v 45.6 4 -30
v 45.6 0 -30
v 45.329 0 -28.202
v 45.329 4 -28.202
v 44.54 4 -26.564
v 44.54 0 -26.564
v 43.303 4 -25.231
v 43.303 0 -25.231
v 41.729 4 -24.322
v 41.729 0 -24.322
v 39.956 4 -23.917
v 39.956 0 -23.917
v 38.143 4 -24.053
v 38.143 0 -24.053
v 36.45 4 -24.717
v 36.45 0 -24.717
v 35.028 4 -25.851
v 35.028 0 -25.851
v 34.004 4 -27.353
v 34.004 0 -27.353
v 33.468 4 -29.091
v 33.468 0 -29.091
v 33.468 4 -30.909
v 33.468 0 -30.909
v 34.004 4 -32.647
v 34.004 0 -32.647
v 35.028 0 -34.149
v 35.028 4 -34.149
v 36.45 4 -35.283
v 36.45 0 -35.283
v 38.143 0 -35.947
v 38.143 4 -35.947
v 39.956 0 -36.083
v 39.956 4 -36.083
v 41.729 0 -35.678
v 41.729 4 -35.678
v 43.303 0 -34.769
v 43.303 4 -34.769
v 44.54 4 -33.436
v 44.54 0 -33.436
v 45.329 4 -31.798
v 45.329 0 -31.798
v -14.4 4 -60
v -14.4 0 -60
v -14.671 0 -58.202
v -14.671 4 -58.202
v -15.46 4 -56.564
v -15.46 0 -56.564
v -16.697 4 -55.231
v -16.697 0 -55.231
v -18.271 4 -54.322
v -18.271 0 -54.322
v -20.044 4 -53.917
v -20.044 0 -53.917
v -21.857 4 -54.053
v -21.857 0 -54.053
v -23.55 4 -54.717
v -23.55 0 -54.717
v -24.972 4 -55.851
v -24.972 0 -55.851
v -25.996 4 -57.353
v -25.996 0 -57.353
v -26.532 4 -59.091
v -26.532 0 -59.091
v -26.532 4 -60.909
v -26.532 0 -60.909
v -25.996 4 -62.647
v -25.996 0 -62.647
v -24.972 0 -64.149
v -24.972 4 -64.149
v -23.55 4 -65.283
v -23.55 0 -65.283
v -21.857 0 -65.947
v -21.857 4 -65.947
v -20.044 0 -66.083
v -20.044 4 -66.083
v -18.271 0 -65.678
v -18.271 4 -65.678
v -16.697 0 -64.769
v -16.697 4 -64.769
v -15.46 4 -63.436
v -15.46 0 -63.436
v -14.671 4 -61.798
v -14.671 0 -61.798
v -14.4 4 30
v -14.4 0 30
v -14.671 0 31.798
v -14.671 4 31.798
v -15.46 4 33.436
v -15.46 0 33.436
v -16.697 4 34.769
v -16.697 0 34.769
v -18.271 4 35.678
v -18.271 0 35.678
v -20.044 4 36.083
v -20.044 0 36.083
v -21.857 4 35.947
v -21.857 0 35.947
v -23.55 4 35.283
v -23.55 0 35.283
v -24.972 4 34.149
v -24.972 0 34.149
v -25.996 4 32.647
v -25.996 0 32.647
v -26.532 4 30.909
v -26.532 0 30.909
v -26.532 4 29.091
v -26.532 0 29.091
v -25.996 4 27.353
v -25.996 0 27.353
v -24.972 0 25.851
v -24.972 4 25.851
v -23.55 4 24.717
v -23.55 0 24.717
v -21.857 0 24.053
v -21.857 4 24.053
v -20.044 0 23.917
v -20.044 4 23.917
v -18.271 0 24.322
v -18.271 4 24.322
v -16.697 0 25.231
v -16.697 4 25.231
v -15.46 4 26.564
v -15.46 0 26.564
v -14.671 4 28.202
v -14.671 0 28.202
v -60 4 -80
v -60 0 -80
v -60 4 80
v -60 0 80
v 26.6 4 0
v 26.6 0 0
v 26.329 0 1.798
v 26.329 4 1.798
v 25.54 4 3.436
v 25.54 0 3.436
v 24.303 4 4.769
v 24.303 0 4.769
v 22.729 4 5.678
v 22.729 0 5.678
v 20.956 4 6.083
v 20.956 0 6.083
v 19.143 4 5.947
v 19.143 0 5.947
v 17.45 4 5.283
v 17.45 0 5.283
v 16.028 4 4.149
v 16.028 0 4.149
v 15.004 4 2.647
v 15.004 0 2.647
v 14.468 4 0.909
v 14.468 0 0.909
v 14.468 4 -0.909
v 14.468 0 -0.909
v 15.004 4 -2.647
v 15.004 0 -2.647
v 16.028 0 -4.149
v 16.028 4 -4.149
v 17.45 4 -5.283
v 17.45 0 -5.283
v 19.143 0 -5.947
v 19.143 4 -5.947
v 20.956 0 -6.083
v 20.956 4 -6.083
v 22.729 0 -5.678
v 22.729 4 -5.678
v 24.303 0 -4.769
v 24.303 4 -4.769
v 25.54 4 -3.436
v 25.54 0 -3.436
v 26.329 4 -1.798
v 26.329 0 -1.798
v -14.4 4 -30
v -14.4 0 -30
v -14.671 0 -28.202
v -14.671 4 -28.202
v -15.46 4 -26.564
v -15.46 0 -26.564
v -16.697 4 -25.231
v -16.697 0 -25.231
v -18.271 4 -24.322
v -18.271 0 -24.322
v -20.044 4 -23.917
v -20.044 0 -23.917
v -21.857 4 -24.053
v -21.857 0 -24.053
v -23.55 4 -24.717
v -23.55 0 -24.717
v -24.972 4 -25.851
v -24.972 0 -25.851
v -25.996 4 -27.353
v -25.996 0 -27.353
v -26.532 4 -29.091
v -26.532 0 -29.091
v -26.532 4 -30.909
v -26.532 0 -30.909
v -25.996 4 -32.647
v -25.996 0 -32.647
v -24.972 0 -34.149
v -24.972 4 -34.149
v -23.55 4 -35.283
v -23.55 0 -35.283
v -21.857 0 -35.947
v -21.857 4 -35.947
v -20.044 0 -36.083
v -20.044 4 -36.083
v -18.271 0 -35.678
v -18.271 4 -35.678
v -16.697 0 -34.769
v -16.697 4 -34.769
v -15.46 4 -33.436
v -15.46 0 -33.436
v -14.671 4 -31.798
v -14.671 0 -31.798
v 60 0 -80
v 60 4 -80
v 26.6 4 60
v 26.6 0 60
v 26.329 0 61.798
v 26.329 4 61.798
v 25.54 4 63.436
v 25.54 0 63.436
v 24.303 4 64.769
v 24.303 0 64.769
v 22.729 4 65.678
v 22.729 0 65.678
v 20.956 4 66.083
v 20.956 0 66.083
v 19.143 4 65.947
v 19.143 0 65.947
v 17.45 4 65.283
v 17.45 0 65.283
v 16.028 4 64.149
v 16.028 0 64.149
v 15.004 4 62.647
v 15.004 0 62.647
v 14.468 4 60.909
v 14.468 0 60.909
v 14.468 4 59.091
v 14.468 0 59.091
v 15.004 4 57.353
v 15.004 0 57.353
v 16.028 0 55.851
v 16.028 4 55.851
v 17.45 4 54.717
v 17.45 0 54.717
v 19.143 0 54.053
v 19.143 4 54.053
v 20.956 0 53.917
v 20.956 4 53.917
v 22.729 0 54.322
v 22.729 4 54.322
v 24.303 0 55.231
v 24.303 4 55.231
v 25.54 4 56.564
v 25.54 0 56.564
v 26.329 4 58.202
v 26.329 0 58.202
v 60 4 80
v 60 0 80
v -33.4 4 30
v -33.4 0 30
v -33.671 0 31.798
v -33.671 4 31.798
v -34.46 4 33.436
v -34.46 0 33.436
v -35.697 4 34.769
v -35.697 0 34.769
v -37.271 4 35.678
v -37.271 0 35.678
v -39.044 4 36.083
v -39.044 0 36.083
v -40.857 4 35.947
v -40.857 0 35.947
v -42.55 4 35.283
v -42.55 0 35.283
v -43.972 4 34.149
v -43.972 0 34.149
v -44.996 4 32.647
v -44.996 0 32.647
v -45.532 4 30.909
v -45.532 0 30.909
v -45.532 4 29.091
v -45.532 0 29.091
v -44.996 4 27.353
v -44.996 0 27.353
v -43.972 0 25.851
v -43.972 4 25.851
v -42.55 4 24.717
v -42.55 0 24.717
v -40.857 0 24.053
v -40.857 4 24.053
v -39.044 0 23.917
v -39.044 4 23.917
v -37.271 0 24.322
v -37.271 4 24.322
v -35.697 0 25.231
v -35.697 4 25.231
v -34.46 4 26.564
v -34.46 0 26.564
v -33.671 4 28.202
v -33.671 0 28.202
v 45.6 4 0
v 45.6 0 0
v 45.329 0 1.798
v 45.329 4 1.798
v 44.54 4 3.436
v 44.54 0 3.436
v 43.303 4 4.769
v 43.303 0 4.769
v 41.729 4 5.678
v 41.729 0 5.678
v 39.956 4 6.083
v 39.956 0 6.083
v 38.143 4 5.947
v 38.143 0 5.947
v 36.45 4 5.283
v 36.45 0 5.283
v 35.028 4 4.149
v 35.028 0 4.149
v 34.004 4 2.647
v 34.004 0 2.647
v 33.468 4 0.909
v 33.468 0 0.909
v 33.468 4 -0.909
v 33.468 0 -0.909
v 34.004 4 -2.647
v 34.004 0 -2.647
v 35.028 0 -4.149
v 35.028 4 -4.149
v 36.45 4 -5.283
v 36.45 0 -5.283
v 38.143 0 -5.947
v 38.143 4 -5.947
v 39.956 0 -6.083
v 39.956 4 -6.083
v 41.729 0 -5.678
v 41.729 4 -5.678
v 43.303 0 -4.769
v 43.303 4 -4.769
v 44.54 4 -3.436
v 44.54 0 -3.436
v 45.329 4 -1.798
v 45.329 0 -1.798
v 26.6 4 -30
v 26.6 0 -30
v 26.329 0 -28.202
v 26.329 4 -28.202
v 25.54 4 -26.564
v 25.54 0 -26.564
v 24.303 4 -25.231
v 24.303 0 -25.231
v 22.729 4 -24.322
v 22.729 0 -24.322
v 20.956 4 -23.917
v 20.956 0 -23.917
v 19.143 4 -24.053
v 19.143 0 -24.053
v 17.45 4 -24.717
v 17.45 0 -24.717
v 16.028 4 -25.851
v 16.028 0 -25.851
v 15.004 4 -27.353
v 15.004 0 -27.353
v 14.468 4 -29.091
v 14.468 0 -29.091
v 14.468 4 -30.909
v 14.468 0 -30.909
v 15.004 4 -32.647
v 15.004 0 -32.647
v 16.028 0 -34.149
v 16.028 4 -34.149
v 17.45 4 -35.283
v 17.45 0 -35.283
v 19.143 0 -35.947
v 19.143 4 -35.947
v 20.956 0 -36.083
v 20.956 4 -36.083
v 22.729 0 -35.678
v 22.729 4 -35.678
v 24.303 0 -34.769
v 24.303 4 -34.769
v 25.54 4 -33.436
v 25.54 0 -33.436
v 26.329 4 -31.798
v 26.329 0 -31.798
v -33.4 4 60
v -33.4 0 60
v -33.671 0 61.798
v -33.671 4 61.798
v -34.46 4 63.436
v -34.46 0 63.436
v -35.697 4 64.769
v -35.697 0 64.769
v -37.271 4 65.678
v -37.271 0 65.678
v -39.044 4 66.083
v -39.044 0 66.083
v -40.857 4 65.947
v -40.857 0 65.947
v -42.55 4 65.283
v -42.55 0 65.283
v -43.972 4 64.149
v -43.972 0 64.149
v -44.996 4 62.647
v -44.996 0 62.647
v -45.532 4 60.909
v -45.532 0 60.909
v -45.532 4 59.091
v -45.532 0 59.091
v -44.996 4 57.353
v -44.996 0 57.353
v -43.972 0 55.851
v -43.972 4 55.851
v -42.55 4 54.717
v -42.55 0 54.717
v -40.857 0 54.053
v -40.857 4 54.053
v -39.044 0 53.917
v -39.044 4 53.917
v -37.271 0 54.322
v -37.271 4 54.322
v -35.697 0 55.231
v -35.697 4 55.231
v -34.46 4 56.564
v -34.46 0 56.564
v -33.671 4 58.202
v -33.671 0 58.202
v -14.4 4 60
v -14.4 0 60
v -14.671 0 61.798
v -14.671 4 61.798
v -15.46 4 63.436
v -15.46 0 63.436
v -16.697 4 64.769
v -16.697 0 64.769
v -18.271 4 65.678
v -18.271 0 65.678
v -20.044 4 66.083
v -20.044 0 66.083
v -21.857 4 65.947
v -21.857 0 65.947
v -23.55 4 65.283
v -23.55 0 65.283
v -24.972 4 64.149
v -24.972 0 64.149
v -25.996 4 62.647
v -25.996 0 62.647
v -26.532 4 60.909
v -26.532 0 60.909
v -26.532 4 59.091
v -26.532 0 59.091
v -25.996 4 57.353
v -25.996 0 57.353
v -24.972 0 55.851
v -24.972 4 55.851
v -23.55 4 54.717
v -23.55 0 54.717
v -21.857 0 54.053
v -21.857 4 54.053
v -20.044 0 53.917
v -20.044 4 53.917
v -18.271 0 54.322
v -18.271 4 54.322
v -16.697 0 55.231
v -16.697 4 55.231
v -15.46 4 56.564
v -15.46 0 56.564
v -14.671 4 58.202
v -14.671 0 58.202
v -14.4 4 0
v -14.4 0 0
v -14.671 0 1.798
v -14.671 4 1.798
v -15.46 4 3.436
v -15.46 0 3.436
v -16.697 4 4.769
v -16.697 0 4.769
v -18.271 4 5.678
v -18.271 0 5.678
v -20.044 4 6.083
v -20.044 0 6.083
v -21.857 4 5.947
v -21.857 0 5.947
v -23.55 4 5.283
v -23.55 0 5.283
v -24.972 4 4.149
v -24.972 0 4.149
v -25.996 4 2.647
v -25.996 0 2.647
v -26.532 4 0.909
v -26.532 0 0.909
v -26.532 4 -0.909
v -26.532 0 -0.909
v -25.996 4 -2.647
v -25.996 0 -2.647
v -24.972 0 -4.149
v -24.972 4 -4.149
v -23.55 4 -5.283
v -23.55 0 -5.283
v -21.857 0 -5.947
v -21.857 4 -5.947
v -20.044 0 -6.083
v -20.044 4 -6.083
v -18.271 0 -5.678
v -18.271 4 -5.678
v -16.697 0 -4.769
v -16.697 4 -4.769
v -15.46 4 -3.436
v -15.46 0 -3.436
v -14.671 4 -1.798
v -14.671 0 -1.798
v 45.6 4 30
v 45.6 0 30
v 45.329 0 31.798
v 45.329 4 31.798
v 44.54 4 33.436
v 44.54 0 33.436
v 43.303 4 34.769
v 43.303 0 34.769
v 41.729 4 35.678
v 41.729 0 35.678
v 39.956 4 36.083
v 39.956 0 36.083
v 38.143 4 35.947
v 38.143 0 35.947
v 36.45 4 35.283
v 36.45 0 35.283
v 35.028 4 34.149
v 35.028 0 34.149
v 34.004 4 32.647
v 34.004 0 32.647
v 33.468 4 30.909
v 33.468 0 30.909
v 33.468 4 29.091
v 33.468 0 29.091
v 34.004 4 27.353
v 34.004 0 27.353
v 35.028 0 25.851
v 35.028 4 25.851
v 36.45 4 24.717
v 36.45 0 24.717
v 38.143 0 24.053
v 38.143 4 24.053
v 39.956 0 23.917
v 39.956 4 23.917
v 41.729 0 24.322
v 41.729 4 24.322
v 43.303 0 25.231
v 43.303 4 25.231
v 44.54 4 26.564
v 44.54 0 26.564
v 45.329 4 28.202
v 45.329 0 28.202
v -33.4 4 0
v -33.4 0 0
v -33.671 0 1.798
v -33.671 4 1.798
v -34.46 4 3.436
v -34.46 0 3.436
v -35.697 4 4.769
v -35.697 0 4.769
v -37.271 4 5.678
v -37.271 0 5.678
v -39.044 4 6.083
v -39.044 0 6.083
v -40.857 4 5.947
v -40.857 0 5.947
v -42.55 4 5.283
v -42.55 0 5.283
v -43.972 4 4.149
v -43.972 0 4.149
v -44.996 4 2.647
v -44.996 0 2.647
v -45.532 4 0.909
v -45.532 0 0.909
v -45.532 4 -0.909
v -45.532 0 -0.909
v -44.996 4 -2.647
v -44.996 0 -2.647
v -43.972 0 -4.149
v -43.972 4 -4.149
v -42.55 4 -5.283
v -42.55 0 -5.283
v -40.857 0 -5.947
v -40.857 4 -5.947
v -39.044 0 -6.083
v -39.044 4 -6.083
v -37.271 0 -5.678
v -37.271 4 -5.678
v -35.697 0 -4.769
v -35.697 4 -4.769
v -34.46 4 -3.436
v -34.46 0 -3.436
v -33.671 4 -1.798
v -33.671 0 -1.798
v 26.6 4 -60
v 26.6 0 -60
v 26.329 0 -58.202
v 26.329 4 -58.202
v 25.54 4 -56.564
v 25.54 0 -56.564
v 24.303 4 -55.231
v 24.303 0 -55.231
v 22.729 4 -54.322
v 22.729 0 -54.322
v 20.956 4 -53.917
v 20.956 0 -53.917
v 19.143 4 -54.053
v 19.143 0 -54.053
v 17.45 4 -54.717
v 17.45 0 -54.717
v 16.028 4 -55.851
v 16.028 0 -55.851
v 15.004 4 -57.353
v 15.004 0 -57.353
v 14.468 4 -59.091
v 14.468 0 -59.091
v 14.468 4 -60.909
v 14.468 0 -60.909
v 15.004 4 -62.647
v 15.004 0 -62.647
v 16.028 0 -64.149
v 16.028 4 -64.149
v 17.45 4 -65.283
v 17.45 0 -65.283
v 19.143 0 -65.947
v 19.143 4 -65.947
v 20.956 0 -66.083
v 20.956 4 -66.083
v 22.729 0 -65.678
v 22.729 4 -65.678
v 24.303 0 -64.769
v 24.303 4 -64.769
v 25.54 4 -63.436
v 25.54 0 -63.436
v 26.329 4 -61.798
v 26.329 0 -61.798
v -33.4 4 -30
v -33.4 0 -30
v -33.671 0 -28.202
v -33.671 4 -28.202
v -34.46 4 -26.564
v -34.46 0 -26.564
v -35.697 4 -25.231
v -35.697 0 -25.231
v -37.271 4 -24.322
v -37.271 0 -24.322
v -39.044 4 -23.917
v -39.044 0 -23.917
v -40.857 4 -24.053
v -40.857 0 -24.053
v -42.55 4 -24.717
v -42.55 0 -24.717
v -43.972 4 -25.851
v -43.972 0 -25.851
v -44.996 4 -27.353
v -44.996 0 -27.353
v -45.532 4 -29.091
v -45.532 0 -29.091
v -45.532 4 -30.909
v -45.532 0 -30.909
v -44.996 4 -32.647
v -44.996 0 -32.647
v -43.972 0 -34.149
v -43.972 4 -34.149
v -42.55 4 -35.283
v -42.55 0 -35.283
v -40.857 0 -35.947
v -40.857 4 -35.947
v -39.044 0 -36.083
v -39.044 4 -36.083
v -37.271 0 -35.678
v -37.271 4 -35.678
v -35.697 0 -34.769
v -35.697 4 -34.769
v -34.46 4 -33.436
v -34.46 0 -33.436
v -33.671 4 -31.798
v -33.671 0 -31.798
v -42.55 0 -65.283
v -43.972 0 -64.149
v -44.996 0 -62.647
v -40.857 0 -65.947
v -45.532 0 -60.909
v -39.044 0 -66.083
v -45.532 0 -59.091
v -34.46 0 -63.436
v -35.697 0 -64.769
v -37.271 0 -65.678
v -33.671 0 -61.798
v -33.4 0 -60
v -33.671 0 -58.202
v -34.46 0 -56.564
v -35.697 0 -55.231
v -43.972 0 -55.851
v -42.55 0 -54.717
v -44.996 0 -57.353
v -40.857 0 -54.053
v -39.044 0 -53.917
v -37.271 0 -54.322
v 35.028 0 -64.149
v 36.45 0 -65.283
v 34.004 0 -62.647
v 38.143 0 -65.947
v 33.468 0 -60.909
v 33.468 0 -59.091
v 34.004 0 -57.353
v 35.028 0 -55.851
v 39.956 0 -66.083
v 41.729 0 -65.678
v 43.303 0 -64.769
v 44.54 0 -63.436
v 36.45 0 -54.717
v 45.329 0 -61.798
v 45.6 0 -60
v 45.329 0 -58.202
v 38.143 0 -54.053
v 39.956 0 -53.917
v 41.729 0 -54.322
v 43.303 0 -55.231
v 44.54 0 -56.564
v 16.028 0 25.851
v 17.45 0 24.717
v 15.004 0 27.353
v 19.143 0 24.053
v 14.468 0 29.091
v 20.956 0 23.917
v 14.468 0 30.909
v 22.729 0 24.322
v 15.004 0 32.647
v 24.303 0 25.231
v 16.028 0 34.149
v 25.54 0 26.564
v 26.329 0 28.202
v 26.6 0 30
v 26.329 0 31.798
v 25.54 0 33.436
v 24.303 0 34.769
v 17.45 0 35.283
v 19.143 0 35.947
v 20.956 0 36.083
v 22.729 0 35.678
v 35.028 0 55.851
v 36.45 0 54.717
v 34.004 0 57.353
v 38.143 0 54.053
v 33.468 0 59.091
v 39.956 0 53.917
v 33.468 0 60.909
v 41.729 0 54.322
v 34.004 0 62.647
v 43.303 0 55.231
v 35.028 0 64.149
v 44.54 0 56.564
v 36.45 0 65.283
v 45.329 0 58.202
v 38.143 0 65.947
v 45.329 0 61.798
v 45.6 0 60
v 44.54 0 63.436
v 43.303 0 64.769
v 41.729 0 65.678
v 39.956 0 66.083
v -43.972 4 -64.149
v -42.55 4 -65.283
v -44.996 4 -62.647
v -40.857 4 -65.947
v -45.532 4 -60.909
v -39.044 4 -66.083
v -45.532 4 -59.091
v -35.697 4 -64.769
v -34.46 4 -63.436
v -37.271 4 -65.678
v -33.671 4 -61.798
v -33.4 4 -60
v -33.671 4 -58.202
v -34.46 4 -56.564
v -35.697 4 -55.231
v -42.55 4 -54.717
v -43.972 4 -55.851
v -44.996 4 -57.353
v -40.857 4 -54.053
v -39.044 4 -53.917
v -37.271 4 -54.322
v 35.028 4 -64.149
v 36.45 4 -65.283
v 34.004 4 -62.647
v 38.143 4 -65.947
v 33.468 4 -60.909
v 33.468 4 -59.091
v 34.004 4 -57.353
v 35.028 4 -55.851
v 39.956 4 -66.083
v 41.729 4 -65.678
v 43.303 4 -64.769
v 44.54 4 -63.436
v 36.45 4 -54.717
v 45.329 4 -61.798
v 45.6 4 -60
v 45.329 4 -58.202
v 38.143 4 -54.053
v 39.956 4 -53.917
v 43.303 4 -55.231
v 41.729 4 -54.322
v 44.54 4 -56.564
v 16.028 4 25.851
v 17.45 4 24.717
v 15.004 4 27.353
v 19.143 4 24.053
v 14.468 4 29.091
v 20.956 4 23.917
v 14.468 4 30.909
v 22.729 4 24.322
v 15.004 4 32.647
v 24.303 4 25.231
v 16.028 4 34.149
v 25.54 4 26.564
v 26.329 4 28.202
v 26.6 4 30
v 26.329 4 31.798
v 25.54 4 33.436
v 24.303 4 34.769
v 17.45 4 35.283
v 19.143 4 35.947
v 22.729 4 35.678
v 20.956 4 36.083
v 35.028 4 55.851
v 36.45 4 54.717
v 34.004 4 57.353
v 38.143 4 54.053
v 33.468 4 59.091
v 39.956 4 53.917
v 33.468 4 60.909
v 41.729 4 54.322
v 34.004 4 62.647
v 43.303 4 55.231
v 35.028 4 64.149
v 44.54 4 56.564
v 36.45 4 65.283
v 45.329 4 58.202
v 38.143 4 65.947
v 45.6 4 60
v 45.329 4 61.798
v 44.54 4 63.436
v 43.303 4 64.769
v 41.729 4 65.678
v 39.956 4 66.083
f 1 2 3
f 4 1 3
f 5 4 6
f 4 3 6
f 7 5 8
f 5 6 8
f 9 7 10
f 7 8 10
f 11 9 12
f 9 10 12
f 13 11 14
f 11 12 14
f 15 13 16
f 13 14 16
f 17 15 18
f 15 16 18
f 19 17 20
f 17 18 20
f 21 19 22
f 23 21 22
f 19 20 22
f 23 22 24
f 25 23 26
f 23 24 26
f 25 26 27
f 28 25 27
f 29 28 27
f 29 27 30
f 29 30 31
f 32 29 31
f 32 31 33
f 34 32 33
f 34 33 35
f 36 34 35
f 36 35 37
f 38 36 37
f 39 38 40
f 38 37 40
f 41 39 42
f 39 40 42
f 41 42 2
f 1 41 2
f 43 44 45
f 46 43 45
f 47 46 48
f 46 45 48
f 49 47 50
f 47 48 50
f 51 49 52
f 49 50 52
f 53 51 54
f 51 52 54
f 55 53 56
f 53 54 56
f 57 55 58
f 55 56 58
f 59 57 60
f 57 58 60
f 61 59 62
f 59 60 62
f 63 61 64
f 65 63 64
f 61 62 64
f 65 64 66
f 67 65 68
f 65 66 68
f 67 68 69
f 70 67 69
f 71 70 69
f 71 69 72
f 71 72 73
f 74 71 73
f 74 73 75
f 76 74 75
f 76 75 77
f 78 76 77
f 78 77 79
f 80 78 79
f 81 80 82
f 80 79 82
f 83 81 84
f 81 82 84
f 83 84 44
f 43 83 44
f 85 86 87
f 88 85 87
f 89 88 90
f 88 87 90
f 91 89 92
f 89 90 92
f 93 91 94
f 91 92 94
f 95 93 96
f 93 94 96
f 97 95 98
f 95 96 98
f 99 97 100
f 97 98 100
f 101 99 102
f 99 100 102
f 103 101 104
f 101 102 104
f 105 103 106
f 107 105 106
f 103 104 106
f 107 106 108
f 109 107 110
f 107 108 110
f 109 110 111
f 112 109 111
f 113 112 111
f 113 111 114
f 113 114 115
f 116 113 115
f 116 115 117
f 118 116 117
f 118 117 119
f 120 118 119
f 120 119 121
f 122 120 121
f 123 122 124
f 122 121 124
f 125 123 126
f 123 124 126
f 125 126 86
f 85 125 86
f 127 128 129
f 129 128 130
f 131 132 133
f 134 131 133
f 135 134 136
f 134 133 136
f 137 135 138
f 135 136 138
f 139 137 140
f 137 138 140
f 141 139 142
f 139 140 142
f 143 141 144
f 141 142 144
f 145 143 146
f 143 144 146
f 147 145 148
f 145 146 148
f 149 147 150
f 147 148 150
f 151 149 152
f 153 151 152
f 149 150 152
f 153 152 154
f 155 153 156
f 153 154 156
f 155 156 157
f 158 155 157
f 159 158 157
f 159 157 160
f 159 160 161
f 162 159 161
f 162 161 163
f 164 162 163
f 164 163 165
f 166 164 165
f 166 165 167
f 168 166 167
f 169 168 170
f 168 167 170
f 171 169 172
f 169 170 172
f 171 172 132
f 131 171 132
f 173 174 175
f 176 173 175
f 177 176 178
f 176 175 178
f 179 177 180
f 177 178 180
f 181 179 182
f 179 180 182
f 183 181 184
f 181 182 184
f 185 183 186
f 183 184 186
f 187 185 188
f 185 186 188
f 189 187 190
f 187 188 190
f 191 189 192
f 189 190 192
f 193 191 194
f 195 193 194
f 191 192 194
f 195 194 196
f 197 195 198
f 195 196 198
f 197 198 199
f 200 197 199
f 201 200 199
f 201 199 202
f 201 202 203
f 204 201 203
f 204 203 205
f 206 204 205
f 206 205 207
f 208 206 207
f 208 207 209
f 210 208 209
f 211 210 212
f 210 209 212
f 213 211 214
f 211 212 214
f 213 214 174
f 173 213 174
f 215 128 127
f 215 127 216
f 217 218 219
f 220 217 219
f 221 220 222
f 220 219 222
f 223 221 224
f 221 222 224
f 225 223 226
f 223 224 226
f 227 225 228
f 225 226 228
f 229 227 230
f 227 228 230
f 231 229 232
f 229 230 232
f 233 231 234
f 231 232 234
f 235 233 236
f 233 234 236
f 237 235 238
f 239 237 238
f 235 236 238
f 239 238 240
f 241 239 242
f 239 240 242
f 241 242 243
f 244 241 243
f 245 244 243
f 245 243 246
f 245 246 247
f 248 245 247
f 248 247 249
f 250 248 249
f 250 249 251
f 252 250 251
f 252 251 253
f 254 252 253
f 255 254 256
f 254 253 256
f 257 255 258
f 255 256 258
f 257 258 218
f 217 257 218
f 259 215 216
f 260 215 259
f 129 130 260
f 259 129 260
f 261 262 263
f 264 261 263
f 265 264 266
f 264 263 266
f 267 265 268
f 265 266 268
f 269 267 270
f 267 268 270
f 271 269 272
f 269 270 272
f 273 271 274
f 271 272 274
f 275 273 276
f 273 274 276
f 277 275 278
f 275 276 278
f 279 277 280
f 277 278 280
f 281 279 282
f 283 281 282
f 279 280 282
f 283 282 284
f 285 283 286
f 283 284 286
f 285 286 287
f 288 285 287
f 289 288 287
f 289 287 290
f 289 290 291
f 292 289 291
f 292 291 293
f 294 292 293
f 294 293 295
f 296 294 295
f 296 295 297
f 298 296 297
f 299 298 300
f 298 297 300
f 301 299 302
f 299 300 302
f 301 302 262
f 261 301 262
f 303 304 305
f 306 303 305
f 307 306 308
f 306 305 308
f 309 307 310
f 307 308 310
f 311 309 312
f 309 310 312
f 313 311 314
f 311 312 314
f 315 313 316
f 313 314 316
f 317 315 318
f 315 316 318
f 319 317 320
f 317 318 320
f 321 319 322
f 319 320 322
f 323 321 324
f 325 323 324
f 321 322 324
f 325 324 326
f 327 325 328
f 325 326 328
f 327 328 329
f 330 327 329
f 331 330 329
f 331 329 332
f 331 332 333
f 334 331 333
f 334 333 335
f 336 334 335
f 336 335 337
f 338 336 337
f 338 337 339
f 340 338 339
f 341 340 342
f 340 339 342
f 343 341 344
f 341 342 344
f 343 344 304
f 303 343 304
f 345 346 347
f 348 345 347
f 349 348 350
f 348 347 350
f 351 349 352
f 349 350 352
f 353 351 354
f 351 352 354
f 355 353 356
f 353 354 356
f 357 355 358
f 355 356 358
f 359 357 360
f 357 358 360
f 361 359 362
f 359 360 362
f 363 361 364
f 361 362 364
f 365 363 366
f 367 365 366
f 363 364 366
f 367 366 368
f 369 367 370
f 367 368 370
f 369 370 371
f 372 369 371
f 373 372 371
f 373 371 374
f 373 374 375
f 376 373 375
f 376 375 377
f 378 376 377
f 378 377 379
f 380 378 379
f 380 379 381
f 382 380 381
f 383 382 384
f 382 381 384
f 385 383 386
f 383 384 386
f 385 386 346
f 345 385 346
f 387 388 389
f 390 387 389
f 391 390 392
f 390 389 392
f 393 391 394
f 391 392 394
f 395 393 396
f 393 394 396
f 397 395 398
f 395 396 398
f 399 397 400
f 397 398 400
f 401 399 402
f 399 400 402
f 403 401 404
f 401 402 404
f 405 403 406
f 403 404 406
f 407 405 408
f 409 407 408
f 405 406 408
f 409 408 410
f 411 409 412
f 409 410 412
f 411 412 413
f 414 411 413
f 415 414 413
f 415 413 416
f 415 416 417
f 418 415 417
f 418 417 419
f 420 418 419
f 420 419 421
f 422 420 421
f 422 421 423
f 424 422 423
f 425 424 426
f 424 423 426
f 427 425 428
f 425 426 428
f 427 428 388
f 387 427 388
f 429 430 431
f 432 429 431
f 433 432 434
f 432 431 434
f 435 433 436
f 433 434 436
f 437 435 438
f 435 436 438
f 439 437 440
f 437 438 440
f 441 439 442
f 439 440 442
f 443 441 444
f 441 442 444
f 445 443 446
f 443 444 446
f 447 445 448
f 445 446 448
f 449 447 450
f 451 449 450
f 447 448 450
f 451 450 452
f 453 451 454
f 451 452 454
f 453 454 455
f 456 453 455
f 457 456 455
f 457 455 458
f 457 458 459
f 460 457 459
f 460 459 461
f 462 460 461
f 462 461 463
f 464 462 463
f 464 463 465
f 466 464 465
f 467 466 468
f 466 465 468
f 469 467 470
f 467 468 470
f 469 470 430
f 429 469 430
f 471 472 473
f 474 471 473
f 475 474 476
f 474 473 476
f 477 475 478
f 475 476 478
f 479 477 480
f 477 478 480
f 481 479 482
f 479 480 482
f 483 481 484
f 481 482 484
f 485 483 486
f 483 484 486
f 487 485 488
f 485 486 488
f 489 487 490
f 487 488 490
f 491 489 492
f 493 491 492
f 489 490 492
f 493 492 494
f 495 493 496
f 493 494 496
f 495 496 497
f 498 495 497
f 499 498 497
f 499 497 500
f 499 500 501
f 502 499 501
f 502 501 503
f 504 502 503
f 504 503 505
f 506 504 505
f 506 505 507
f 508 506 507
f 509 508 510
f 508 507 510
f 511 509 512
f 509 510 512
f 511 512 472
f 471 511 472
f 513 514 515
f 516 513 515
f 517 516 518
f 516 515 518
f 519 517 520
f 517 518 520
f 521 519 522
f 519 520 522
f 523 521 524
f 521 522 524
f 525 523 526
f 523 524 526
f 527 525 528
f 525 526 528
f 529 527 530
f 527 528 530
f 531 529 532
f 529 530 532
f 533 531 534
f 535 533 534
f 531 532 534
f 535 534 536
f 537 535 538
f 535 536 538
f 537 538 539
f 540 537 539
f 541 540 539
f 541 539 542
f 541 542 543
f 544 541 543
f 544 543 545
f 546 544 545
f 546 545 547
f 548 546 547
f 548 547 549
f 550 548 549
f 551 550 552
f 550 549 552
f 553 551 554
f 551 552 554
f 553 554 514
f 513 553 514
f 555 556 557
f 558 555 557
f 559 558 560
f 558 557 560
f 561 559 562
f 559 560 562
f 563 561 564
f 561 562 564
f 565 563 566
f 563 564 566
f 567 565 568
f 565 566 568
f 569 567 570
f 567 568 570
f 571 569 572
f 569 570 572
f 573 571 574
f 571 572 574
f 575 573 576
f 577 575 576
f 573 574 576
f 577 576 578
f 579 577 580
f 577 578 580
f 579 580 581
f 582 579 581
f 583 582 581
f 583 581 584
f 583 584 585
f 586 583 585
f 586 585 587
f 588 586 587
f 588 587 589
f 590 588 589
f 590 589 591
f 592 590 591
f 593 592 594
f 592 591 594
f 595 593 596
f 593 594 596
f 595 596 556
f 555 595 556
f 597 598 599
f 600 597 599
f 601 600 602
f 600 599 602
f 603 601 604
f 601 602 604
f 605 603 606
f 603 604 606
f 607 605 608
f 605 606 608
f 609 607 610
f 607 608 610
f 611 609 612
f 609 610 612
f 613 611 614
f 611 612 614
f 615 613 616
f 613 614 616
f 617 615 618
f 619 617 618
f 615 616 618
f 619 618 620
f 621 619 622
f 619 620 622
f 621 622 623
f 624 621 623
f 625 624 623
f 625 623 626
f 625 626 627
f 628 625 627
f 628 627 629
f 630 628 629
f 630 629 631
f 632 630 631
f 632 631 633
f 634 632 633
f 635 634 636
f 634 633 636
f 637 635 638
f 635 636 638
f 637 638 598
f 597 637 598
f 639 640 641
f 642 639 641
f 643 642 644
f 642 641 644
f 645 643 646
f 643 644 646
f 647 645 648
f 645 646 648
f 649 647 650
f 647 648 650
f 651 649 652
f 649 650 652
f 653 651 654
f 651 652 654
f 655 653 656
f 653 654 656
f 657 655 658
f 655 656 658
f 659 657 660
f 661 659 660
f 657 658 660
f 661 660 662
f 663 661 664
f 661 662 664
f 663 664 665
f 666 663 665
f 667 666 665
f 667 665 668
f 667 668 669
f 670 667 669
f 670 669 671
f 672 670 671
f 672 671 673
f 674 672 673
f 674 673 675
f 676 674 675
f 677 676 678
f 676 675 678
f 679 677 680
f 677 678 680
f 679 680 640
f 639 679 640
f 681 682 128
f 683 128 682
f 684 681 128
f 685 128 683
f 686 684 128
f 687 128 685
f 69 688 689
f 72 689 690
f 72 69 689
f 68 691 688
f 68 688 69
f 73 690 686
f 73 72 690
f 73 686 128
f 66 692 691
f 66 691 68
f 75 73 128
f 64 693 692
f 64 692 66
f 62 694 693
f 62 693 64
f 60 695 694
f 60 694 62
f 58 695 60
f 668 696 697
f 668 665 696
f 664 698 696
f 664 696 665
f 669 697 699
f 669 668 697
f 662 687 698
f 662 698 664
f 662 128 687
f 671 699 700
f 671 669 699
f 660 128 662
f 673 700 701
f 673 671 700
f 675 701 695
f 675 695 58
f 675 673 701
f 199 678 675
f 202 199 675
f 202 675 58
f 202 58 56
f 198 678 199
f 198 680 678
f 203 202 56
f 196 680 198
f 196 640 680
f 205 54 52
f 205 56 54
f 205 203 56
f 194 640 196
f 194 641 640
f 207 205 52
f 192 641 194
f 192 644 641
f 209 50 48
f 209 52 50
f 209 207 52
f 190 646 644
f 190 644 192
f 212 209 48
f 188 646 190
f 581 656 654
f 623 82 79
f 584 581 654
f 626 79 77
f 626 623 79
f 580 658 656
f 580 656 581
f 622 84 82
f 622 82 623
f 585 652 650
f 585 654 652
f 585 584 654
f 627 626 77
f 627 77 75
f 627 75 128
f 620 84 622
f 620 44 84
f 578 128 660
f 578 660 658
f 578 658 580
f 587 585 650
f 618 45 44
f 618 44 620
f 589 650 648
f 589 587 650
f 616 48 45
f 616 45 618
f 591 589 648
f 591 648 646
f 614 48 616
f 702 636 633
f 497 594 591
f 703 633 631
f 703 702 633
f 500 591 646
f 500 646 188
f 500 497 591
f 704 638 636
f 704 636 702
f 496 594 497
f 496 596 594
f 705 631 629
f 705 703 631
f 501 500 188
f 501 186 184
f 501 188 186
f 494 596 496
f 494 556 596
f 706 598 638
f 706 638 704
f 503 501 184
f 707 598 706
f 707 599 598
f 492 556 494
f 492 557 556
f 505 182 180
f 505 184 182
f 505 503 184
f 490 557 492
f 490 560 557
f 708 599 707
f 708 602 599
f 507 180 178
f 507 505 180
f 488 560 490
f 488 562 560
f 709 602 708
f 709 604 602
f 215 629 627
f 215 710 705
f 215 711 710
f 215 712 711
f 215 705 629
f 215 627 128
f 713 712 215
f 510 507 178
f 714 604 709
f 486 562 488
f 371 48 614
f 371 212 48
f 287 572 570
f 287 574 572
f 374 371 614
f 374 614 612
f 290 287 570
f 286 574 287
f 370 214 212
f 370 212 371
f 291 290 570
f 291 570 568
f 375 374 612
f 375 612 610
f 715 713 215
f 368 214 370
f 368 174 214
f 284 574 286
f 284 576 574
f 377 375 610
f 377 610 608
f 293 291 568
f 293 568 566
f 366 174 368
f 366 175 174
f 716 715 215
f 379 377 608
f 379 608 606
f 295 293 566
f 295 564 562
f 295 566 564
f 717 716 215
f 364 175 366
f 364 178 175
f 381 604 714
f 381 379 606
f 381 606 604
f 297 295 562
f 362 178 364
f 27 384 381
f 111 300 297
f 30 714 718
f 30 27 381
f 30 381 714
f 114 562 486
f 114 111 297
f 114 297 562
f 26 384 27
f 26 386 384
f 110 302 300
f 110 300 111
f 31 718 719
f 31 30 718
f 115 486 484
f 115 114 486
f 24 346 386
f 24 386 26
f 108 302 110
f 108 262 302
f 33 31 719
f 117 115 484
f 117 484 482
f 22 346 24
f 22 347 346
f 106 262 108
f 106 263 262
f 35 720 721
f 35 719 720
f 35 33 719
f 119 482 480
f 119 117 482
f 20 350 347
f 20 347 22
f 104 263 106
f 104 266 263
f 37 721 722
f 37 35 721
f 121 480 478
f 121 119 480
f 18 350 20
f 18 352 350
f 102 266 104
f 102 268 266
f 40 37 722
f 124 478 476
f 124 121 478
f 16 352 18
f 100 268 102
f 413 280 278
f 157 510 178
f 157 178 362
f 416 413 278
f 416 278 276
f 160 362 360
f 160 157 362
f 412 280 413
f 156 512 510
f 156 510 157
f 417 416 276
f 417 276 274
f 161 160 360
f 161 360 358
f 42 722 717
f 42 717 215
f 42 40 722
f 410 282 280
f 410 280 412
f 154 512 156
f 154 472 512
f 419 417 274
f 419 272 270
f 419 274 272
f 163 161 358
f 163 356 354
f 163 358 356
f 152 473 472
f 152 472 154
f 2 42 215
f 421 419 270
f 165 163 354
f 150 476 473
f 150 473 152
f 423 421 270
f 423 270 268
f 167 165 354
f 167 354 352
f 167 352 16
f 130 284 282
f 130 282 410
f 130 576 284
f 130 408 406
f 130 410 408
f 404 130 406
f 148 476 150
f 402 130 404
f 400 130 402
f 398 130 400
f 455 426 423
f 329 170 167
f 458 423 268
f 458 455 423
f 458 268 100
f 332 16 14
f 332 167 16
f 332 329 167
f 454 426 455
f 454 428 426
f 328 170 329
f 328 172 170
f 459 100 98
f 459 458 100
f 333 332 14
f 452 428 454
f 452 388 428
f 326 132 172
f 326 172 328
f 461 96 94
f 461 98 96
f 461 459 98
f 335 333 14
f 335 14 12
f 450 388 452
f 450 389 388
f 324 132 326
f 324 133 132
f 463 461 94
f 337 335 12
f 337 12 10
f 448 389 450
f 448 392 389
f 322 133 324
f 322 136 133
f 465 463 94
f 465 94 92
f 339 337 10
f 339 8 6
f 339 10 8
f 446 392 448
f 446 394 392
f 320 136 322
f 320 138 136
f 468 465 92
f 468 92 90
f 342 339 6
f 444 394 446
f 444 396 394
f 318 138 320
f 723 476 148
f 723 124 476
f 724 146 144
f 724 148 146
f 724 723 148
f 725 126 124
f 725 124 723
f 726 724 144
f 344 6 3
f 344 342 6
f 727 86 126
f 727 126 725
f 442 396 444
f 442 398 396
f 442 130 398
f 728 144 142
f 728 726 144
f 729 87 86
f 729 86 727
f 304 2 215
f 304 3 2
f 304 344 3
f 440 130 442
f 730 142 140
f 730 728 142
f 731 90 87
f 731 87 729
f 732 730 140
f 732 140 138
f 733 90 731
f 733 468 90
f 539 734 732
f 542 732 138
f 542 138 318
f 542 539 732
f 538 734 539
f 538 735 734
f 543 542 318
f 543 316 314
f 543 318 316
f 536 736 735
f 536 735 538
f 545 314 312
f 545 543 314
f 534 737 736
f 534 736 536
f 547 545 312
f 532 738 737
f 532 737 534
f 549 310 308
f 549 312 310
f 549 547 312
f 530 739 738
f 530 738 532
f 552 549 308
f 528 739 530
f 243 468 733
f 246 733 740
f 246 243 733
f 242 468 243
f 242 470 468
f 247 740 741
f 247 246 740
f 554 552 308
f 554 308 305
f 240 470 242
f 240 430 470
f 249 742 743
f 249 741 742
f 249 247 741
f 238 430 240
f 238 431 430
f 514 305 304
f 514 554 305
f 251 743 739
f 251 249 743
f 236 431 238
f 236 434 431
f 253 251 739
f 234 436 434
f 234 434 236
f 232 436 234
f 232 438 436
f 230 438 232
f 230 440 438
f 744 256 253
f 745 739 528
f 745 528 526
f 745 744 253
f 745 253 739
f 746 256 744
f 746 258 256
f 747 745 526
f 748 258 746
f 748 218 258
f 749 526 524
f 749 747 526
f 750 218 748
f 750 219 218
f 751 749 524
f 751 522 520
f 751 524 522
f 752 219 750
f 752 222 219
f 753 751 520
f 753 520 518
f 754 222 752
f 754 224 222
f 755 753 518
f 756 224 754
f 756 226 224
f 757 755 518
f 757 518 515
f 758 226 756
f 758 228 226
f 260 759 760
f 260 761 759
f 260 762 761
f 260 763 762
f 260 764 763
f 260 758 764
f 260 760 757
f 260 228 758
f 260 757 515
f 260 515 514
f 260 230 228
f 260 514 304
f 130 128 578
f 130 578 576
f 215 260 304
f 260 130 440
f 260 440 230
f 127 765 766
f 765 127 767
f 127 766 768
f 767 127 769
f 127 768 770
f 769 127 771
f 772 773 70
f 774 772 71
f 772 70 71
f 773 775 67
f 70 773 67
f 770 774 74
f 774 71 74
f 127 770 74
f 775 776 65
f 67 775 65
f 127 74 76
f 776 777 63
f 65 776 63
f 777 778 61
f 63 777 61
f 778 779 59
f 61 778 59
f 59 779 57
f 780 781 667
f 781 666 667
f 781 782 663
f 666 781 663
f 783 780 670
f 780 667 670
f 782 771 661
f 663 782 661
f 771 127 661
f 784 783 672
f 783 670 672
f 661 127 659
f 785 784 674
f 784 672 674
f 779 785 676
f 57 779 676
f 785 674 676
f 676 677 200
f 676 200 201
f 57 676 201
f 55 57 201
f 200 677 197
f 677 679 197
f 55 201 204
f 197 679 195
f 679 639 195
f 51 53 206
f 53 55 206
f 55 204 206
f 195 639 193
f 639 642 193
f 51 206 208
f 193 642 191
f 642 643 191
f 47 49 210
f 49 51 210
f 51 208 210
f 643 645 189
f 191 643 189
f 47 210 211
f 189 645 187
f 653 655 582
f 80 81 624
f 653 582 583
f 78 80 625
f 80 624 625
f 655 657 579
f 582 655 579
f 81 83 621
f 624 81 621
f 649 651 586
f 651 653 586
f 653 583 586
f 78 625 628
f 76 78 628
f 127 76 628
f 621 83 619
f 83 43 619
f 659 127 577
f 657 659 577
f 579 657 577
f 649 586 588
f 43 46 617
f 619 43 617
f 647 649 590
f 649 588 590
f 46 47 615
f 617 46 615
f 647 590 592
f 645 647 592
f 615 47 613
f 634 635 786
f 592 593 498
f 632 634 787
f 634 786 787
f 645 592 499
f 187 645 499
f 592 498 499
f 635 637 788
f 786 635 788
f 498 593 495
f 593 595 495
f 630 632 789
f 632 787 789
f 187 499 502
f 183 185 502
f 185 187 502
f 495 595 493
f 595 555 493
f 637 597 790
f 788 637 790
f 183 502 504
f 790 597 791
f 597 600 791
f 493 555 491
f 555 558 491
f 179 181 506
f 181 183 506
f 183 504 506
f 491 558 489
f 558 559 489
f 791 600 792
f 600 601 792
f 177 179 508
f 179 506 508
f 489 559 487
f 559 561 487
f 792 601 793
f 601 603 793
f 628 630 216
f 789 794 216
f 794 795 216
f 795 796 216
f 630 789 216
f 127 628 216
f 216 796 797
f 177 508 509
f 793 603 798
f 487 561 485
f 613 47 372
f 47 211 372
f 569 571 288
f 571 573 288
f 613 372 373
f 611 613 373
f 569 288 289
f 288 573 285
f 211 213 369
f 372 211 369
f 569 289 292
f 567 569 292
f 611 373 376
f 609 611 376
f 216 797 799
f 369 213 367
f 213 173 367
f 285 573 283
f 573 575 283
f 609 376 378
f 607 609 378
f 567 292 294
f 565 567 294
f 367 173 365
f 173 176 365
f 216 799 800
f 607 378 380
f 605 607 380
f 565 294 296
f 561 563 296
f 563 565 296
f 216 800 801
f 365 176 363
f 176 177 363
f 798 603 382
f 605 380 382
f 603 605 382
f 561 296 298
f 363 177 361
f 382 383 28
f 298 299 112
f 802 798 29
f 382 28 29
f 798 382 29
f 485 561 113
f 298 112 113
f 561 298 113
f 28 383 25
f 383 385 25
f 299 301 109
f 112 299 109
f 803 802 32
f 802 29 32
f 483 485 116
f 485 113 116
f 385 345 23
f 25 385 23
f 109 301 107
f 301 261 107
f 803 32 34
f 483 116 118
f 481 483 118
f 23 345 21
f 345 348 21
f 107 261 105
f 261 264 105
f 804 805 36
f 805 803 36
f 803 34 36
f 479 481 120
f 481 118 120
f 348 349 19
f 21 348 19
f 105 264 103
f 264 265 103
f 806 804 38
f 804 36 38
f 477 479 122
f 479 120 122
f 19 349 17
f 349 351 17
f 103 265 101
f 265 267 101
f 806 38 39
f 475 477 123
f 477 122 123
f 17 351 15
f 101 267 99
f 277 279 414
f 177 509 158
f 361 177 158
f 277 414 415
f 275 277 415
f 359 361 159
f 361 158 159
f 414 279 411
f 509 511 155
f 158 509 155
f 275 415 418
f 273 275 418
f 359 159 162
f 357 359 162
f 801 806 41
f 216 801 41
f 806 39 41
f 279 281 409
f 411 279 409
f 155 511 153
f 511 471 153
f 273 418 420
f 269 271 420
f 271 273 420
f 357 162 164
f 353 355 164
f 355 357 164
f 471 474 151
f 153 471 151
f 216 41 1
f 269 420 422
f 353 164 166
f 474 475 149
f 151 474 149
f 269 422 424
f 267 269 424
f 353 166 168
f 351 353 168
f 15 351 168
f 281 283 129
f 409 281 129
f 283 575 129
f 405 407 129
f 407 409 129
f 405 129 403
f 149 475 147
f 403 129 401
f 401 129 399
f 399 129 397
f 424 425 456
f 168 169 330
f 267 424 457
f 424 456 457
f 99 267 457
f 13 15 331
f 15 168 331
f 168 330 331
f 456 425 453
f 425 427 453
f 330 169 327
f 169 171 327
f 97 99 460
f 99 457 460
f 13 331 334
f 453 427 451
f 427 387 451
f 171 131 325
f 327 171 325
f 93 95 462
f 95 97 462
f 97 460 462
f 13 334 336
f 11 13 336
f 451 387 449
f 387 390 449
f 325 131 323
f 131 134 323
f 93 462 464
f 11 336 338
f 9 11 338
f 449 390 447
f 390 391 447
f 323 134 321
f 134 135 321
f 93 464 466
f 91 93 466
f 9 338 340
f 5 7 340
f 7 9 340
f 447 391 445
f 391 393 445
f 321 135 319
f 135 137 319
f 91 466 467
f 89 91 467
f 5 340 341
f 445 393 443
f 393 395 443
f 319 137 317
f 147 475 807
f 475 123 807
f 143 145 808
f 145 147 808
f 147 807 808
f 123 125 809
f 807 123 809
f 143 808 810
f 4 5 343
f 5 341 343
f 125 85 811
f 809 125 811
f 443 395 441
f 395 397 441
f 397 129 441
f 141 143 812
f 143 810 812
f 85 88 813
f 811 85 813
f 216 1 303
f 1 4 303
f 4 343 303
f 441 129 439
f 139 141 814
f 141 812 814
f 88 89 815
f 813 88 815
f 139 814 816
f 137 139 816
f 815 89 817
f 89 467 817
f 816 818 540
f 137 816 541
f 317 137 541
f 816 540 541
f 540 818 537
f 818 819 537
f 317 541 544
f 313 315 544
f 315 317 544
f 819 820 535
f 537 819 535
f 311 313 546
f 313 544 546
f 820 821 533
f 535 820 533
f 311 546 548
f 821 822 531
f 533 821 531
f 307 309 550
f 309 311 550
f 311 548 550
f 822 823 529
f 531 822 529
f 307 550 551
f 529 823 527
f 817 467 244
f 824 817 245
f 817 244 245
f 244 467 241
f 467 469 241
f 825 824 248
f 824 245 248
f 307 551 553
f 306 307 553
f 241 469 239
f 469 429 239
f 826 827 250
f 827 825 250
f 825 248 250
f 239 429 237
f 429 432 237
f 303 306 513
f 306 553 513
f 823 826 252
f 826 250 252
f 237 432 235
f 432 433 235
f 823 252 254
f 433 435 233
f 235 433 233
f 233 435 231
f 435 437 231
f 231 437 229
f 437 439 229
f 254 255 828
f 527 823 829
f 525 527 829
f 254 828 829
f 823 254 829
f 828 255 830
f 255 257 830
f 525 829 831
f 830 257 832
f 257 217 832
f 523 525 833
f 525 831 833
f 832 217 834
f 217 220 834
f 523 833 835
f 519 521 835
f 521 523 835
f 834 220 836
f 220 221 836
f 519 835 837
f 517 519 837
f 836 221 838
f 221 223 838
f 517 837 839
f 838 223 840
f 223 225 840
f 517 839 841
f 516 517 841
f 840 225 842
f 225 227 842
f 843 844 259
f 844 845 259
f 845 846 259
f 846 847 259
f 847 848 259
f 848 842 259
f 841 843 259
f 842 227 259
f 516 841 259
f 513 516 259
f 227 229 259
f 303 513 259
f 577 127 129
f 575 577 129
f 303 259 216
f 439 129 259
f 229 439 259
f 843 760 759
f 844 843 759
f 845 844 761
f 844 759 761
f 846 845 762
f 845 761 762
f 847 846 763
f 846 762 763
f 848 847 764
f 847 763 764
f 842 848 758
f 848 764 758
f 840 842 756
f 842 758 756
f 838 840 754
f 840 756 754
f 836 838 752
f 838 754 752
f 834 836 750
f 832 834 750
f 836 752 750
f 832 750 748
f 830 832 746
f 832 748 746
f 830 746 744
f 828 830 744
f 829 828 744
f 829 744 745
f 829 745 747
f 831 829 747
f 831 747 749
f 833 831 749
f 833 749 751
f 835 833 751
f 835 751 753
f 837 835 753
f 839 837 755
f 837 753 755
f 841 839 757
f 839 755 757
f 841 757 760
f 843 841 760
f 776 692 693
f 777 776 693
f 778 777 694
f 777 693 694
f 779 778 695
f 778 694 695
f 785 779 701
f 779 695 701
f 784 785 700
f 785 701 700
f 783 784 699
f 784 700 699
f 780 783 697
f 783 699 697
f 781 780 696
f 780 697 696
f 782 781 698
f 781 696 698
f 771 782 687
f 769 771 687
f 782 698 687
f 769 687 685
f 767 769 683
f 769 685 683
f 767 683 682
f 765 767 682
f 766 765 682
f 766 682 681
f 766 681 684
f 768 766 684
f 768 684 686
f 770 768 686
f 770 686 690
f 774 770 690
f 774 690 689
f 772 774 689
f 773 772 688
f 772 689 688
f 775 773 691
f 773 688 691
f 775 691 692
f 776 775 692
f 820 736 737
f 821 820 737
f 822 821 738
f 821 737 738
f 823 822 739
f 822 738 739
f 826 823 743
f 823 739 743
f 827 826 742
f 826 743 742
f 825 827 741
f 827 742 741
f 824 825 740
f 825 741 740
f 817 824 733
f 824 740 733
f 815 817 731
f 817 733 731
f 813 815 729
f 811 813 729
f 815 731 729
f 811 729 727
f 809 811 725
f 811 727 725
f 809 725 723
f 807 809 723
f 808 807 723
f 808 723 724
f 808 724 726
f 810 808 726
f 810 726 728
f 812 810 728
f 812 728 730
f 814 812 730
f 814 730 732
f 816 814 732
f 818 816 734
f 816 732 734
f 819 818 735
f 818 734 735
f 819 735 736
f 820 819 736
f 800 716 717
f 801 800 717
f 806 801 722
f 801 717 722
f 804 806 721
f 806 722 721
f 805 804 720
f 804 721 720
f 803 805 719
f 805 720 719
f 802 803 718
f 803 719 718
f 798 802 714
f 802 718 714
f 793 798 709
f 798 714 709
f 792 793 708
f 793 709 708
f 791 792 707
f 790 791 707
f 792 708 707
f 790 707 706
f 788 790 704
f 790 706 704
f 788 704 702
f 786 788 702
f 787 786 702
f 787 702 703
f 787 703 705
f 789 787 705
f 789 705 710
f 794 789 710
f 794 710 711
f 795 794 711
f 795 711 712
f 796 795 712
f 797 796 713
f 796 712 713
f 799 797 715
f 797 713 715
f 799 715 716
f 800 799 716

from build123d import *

# Parameters (mm, degrees)
F0_W     = 120
F0_H     = 160
F0_R     = 6.1
F1_DEPTH = 4


with BuildPart() as f1:
    # F0 (on Front) → F1 (new body)
    with BuildSketch(Plane.XZ):
        Rectangle(F0_W, F0_H)
        with Locations((-39.5, -60)):
            Circle(F0_R, mode=Mode.SUBTRACT)
        with Locations((-20.5, -60)):
            Circle(F0_R, mode=Mode.SUBTRACT)
        with Locations((-39.5, -30)):
            Circle(F0_R, mode=Mode.SUBTRACT)
        with Locations((-20.5, -30)):
            Circle(F0_R, mode=Mode.SUBTRACT)
        with Locations((20.5, -60)):
            Circle(F0_R, mode=Mode.SUBTRACT)
        with Locations((39.5, -60)):
            Circle(F0_R, mode=Mode.SUBTRACT)
        with Locations((20.5, -30)):
            Circle(F0_R, mode=Mode.SUBTRACT)
        with Locations((39.5, -30)):
            Circle(F0_R, mode=Mode.SUBTRACT)
        with Locations((-39.5, 0)):
            Circle(F0_R, mode=Mode.SUBTRACT)
        with Locations((-39.5, 30)):
            Circle(F0_R, mode=Mode.SUBTRACT)
        with Locations((-20.5, 0)):
            Circle(F0_R, mode=Mode.SUBTRACT)
        with Locations((-20.5, 30)):
            Circle(F0_R, mode=Mode.SUBTRACT)
        with Locations((-39.5, 60)):
            Circle(F0_R, mode=Mode.SUBTRACT)
        with Locations((-20.5, 60)):
            Circle(F0_R, mode=Mode.SUBTRACT)
        with Locations((20.5, 0)):
            Circle(F0_R, mode=Mode.SUBTRACT)
        with Locations((20.5, 30)):
            Circle(F0_R, mode=Mode.SUBTRACT)
        with Locations((39.5, 0)):
            Circle(F0_R, mode=Mode.SUBTRACT)
        with Locations((39.5, 30)):
            Circle(F0_R, mode=Mode.SUBTRACT)
        with Locations((20.5, 60)):
            Circle(F0_R, mode=Mode.SUBTRACT)
        with Locations((39.5, 60)):
            Circle(F0_R, mode=Mode.SUBTRACT)
    extrude(amount=-F1_DEPTH)


solid = f1.part
